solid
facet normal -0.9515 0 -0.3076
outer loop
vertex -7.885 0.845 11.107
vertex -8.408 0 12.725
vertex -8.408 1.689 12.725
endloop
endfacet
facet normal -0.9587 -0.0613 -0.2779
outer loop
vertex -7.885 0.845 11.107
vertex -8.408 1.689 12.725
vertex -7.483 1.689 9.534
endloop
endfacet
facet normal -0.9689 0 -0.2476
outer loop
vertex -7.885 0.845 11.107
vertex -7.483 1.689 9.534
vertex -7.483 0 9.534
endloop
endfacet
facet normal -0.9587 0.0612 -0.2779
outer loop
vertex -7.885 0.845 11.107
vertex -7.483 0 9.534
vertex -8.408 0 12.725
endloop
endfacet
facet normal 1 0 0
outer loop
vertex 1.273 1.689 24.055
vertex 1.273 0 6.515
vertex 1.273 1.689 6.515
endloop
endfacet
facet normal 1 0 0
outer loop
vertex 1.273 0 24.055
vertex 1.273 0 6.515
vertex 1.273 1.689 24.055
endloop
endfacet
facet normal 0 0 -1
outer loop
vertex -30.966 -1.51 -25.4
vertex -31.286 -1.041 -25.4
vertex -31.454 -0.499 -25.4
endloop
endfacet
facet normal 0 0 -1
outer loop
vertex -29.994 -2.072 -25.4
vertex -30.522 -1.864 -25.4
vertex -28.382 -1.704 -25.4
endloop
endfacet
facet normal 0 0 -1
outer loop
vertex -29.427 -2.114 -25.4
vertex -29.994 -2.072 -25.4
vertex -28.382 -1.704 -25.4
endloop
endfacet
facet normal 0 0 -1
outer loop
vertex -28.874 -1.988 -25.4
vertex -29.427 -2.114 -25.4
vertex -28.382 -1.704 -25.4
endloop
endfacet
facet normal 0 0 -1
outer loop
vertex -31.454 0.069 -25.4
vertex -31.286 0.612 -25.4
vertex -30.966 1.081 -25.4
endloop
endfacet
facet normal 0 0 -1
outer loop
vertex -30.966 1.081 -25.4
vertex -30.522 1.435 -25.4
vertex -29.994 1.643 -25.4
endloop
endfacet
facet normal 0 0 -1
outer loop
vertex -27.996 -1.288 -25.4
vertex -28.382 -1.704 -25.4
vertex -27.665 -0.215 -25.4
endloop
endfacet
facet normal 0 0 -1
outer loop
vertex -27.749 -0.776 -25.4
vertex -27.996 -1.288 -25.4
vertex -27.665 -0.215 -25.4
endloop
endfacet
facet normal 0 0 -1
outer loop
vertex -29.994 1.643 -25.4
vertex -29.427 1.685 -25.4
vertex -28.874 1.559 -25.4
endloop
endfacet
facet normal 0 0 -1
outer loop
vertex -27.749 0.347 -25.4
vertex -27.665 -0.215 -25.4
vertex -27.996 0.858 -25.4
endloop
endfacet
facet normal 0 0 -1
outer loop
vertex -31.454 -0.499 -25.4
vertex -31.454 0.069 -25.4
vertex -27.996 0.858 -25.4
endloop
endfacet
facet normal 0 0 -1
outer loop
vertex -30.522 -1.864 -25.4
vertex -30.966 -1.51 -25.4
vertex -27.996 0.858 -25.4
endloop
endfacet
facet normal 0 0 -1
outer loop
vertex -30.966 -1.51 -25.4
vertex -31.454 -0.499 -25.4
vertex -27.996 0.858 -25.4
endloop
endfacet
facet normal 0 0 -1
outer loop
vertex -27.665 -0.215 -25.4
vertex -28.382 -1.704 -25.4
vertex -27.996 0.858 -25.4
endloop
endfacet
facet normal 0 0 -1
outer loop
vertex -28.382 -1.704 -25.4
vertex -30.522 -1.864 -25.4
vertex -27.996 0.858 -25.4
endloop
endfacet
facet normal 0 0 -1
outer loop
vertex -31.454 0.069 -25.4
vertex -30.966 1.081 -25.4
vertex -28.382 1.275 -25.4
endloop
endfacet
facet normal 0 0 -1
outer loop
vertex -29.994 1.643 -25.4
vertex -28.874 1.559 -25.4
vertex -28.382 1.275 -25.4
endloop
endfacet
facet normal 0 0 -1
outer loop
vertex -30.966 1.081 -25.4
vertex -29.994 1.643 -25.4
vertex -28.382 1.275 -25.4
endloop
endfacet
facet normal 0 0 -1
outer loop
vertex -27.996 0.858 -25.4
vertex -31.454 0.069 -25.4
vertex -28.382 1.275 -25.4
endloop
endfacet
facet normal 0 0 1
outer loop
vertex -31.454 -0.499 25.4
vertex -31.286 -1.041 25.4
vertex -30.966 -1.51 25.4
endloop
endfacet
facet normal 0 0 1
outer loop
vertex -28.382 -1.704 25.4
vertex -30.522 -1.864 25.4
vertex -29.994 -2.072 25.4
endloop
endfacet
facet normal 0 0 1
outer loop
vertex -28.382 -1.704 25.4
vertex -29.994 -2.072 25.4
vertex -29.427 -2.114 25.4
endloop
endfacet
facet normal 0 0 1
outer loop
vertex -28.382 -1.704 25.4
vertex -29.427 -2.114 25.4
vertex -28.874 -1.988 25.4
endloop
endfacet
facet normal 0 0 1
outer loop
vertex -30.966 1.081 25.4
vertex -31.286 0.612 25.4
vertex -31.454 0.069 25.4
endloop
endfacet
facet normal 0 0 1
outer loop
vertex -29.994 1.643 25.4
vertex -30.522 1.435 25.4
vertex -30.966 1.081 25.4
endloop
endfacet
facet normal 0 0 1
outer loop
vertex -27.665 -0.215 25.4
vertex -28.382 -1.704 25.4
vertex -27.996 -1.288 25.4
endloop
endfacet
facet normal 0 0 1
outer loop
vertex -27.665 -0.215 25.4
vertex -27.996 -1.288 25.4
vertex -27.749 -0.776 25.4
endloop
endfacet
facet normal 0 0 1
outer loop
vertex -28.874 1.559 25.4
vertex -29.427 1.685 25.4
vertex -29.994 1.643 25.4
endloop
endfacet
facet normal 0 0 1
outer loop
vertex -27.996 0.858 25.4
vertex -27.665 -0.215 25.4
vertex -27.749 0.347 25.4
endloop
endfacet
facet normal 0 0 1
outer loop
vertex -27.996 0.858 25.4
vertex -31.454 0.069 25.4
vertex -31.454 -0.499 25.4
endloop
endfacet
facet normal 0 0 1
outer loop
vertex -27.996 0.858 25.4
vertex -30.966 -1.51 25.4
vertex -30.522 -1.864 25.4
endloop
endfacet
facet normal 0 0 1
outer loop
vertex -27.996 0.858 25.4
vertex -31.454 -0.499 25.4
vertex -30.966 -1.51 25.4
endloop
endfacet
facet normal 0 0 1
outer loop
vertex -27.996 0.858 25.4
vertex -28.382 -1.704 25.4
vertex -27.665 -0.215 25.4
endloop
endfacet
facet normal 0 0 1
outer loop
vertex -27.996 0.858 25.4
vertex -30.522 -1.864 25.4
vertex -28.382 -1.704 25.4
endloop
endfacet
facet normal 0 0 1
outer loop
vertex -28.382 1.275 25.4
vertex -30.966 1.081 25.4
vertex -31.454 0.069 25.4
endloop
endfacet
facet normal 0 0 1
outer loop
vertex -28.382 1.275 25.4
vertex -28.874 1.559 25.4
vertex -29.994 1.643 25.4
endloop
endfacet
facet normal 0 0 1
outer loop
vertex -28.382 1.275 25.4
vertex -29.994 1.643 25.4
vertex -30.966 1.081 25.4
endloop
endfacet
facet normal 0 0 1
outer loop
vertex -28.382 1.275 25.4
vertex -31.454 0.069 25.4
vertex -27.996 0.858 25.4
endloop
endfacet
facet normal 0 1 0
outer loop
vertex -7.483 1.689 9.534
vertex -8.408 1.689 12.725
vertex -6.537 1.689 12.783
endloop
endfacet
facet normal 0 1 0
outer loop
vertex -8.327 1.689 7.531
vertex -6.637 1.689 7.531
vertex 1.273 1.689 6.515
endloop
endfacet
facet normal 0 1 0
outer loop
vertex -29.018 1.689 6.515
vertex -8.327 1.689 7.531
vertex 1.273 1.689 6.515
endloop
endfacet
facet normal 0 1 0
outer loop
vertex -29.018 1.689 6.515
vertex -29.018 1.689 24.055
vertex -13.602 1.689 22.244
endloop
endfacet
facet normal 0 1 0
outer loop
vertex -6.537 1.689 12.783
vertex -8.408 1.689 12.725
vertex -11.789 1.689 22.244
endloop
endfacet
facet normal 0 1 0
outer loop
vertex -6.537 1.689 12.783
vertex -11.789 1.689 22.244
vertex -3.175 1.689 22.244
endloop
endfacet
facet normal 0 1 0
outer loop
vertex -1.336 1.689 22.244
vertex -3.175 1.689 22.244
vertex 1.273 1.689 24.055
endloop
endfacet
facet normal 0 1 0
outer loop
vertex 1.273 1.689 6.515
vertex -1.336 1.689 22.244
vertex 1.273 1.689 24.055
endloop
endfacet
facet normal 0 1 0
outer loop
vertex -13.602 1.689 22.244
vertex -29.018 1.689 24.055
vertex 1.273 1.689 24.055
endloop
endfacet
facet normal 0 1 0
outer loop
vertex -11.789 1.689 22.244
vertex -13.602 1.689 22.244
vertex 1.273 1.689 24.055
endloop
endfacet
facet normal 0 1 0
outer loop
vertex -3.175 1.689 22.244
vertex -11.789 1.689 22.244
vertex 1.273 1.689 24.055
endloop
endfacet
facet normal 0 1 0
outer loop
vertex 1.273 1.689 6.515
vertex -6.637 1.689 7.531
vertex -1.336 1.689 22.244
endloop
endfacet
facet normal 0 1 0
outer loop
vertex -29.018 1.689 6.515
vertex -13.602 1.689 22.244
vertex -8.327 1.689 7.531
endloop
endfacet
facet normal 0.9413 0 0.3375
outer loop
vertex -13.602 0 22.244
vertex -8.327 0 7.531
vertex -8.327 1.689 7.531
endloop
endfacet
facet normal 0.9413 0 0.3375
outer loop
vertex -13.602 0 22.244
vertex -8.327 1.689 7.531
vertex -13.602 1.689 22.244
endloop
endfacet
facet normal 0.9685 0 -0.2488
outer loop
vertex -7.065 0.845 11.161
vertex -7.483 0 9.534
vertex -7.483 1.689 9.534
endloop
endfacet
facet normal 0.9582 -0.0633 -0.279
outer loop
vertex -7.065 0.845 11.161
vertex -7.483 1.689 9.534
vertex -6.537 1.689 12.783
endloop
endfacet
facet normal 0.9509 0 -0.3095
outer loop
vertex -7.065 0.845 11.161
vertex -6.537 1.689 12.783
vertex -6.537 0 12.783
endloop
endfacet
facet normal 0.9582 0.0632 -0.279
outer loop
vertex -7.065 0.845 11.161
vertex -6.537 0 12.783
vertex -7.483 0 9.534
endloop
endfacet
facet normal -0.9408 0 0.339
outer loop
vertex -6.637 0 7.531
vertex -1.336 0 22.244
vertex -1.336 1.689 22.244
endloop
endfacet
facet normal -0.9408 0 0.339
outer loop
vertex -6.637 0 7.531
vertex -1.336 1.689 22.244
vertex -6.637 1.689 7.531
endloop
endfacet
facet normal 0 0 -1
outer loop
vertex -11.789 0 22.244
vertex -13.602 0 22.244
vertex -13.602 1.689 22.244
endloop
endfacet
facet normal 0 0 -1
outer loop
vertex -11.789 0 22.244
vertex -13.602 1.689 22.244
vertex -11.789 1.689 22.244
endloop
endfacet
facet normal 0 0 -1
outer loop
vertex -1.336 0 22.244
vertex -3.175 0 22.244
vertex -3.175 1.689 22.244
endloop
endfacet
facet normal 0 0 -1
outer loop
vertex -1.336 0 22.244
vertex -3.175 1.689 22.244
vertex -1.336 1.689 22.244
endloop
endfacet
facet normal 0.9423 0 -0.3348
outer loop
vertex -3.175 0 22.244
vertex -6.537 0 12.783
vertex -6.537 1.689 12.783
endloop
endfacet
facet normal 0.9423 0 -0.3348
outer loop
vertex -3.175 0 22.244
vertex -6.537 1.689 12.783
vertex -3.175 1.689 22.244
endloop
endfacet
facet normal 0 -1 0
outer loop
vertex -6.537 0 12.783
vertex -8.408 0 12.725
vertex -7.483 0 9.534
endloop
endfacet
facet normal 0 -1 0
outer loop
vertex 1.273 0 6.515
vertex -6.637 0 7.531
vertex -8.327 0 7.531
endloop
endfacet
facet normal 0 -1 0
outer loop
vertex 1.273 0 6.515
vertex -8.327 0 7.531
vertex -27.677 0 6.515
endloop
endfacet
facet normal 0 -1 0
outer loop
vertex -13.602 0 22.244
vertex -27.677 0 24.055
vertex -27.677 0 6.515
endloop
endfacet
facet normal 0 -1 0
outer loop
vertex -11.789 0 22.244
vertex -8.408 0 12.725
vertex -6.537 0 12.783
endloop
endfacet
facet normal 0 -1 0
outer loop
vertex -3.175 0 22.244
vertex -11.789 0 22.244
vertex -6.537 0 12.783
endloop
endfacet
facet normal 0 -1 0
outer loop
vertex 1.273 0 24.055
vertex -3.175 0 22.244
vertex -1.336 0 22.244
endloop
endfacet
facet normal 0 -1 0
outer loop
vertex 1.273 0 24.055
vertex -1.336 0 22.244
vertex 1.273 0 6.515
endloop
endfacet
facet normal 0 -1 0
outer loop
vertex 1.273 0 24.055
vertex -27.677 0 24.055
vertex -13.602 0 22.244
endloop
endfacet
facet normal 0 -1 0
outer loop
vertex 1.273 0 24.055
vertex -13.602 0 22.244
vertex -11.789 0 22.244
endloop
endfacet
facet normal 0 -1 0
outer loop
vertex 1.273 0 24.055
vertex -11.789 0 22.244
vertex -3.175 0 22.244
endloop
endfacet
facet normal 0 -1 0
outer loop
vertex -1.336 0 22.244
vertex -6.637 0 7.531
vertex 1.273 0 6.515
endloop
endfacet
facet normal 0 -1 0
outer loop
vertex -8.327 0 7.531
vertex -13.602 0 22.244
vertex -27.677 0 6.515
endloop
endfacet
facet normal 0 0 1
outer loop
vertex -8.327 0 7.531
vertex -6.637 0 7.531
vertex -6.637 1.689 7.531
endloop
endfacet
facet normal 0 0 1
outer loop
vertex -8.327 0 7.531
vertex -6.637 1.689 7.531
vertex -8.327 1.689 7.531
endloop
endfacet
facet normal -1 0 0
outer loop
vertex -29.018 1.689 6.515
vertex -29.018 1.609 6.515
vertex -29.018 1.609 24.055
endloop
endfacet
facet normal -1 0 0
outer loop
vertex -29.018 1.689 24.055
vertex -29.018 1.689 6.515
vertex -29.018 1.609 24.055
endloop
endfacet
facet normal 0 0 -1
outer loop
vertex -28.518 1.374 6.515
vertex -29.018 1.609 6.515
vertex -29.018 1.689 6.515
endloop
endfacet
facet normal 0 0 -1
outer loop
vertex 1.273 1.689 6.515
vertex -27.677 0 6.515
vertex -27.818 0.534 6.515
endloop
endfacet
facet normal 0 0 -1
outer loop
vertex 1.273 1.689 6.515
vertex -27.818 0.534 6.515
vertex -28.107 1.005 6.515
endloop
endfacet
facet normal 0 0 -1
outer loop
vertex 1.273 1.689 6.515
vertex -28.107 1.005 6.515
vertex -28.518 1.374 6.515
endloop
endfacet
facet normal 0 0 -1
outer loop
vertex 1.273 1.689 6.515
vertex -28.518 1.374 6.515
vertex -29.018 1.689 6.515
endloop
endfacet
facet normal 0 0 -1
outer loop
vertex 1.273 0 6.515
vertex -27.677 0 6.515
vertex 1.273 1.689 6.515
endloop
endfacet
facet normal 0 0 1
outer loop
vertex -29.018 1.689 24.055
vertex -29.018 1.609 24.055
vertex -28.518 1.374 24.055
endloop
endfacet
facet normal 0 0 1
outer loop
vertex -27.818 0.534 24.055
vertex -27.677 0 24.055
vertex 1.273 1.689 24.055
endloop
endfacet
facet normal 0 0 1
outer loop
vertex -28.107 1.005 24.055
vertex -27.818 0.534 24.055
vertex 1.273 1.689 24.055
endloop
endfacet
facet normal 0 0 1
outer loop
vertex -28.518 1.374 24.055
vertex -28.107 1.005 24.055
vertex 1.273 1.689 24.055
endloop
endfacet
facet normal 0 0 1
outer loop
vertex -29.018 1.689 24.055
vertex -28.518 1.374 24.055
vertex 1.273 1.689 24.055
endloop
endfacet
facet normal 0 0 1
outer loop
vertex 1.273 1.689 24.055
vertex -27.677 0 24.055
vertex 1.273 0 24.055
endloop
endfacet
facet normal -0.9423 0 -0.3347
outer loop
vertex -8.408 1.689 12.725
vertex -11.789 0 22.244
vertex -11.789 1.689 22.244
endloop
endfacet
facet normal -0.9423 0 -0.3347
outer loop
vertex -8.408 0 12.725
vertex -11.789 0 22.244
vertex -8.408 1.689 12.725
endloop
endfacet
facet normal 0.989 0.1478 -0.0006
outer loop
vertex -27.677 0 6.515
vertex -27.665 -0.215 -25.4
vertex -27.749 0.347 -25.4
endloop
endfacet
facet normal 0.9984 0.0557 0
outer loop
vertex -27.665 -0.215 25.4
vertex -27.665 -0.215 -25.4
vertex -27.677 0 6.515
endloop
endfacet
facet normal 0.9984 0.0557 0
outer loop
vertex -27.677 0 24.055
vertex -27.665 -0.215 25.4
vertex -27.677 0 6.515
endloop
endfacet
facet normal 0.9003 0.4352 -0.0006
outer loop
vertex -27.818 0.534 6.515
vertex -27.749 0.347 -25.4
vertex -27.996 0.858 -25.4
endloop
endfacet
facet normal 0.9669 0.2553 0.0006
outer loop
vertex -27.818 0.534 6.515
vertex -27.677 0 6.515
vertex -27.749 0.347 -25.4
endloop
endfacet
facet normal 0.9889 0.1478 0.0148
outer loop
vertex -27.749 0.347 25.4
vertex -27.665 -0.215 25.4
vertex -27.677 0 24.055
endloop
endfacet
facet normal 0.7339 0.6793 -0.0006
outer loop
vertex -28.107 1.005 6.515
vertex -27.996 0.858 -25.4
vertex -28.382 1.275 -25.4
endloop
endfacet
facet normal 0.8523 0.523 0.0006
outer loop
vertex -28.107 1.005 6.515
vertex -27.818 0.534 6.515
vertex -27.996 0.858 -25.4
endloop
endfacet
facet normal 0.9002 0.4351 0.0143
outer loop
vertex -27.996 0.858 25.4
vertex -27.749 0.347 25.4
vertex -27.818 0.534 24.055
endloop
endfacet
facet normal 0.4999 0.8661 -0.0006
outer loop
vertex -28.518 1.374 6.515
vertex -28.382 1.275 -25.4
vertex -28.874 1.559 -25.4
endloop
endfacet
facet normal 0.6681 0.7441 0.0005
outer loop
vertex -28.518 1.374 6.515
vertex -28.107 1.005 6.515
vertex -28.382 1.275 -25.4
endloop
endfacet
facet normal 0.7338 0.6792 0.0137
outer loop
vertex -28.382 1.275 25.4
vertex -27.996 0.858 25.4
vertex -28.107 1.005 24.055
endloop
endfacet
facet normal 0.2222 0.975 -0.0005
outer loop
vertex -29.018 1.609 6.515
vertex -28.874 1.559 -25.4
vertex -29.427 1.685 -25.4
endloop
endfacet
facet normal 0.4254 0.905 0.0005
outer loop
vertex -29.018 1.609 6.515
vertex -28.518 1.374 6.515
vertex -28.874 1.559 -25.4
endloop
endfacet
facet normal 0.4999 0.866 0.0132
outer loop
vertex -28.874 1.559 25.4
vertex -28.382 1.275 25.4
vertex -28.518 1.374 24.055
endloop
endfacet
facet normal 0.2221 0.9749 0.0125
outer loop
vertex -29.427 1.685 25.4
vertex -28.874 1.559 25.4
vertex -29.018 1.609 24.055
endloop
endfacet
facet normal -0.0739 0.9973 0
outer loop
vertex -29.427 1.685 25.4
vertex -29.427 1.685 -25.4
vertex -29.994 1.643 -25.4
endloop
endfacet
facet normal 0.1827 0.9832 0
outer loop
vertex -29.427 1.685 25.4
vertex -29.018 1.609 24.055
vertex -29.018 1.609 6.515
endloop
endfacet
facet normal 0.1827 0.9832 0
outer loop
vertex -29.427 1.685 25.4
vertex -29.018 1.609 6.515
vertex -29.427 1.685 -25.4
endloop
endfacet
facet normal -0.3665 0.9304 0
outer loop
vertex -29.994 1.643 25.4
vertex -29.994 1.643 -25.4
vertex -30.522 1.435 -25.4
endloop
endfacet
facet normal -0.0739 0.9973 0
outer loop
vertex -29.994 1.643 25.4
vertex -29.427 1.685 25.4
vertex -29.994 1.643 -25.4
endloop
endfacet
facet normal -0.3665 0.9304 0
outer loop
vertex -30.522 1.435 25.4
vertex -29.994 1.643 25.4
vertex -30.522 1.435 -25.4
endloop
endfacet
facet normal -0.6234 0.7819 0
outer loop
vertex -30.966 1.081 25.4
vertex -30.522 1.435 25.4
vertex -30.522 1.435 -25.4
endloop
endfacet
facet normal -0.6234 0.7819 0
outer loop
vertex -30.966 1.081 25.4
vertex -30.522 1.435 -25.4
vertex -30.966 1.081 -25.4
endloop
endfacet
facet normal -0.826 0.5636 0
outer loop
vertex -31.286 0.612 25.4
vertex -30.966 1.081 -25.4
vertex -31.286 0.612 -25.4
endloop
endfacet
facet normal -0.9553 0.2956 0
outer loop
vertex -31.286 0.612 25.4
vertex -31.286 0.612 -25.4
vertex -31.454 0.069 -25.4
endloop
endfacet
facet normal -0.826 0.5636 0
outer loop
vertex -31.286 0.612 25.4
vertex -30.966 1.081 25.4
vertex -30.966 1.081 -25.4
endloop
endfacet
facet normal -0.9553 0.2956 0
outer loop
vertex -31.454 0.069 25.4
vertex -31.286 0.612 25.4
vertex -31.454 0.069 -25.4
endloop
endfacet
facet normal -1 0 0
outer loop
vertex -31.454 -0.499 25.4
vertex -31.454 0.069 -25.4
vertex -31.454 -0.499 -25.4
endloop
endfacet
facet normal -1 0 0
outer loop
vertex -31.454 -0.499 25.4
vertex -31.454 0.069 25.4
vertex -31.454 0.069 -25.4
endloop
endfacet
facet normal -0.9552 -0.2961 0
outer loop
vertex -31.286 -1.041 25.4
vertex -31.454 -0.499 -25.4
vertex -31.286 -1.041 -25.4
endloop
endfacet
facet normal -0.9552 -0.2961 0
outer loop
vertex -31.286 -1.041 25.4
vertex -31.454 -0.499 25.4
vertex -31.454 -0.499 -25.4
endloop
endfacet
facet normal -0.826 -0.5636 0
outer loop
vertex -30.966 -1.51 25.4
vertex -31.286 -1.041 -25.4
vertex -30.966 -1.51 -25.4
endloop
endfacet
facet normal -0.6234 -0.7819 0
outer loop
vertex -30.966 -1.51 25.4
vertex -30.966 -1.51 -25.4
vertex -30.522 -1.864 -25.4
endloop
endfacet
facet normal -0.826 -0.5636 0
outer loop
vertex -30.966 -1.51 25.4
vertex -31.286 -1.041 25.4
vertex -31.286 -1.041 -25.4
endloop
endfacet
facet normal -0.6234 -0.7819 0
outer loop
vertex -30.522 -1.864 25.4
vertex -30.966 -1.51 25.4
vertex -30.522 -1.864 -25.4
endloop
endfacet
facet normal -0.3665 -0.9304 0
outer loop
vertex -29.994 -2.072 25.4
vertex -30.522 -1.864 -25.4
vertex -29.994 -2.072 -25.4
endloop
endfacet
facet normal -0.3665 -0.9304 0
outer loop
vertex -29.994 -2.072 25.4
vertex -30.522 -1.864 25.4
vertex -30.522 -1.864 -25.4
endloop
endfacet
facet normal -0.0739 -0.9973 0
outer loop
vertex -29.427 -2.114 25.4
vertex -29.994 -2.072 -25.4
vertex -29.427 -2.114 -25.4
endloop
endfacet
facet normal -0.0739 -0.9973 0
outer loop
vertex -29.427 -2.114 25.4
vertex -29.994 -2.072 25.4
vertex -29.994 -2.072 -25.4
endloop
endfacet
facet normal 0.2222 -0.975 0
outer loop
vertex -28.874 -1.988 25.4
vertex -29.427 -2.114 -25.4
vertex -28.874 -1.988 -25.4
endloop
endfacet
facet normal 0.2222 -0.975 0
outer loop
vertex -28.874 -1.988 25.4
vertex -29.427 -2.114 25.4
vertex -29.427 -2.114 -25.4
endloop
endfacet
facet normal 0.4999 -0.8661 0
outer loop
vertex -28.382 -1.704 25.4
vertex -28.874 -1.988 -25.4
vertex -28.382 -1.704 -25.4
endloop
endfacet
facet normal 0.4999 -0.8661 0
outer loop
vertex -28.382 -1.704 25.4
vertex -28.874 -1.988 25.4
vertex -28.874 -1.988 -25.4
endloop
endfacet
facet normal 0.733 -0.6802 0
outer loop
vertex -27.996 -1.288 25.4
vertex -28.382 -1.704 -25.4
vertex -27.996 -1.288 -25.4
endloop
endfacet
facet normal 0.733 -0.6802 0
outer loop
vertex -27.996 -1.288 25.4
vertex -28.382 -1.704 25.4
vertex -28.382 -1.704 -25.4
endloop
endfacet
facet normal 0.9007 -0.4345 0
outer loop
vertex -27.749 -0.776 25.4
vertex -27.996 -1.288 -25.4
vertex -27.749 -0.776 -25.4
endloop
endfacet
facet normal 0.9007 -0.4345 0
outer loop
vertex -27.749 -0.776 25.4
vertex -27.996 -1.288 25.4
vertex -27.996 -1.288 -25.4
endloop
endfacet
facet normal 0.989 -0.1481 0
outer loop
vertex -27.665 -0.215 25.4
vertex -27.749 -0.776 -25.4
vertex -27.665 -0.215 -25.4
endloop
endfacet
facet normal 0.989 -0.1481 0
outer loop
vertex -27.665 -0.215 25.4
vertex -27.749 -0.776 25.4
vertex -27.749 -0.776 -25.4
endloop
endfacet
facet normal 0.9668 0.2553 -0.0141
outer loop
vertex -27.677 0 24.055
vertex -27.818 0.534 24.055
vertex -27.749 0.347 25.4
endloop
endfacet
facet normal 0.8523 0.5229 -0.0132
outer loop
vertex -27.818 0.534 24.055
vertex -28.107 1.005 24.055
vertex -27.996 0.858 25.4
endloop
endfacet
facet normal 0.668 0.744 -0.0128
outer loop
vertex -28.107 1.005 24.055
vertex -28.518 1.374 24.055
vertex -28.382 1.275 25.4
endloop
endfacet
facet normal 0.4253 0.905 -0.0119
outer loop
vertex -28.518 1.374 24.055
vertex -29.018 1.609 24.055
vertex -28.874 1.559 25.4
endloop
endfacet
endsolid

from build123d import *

# Parameters (mm, degrees)
F0_R     = 1.905
F1_DEPTH = 25.4
F2_W     = 30.2913453197
F2_H     = 17.5393885002
F4_DEPTH = 1.6891


with BuildPart() as f1:
    # F0 (on Top) → F1 (new body, symmetric)
    with BuildSketch(Plane.XY):
        with Locations((-29.5697990805, 21.6293018311)):
            Circle(F0_R)
    extrude(amount=F1_DEPTH, both=True)


with BuildPart() as f1_1:
    # F3: moved
    add(f1.part.moved(Location((0, -21.844, 0))))

    # F2 (on Front) → F4 (join)
    with BuildSketch(Plane.XZ):
        with Locations((-13.8722935808, 15.2848851867)):
            Rectangle(F2_W, F2_H)
        with BuildLine():
            Line((-6.5367437352, 12.7834337886), (-3.1749898142, 22.2440018152))
            Line((-3.1749898142, 22.2440018152), (-1.3363293843, 22.2440018152))
            Line((-1.3363293843, 22.2440018152), (-6.6365659302, 7.5314983048))
            Line((-6.6365659302, 7.5314983048), (-8.3271031031, 7.5314983048))
            Line((-8.3271031031, 7.5314983048), (-13.6015790825, 22.2440018152))
            Line((-13.6015790825, 22.2440018152), (-11.788679219, 22.2440018152))
            Line((-11.788679219, 22.2440018152), (-8.4076048732, 12.7254725141))
            add(Edge.make_bspline(
                [(-8.4076048732, 12.7254725141), (-7.8247720574, 11.0832364033), (-7.483444552, 9.5343823459)],
                knots=[0, 0, 0, 1, 1, 1], degree=2))
            add(Edge.make_bspline(
                [(-7.483444552, 9.5343823459), (-7.119576551, 11.1637381734), (-6.5367437352, 12.7834337886)],
                knots=[0, 0, 0, 1, 1, 1], degree=2))
        make_face(mode=Mode.SUBTRACT)
    extrude(amount=-F4_DEPTH)


solid = f1_1.part
